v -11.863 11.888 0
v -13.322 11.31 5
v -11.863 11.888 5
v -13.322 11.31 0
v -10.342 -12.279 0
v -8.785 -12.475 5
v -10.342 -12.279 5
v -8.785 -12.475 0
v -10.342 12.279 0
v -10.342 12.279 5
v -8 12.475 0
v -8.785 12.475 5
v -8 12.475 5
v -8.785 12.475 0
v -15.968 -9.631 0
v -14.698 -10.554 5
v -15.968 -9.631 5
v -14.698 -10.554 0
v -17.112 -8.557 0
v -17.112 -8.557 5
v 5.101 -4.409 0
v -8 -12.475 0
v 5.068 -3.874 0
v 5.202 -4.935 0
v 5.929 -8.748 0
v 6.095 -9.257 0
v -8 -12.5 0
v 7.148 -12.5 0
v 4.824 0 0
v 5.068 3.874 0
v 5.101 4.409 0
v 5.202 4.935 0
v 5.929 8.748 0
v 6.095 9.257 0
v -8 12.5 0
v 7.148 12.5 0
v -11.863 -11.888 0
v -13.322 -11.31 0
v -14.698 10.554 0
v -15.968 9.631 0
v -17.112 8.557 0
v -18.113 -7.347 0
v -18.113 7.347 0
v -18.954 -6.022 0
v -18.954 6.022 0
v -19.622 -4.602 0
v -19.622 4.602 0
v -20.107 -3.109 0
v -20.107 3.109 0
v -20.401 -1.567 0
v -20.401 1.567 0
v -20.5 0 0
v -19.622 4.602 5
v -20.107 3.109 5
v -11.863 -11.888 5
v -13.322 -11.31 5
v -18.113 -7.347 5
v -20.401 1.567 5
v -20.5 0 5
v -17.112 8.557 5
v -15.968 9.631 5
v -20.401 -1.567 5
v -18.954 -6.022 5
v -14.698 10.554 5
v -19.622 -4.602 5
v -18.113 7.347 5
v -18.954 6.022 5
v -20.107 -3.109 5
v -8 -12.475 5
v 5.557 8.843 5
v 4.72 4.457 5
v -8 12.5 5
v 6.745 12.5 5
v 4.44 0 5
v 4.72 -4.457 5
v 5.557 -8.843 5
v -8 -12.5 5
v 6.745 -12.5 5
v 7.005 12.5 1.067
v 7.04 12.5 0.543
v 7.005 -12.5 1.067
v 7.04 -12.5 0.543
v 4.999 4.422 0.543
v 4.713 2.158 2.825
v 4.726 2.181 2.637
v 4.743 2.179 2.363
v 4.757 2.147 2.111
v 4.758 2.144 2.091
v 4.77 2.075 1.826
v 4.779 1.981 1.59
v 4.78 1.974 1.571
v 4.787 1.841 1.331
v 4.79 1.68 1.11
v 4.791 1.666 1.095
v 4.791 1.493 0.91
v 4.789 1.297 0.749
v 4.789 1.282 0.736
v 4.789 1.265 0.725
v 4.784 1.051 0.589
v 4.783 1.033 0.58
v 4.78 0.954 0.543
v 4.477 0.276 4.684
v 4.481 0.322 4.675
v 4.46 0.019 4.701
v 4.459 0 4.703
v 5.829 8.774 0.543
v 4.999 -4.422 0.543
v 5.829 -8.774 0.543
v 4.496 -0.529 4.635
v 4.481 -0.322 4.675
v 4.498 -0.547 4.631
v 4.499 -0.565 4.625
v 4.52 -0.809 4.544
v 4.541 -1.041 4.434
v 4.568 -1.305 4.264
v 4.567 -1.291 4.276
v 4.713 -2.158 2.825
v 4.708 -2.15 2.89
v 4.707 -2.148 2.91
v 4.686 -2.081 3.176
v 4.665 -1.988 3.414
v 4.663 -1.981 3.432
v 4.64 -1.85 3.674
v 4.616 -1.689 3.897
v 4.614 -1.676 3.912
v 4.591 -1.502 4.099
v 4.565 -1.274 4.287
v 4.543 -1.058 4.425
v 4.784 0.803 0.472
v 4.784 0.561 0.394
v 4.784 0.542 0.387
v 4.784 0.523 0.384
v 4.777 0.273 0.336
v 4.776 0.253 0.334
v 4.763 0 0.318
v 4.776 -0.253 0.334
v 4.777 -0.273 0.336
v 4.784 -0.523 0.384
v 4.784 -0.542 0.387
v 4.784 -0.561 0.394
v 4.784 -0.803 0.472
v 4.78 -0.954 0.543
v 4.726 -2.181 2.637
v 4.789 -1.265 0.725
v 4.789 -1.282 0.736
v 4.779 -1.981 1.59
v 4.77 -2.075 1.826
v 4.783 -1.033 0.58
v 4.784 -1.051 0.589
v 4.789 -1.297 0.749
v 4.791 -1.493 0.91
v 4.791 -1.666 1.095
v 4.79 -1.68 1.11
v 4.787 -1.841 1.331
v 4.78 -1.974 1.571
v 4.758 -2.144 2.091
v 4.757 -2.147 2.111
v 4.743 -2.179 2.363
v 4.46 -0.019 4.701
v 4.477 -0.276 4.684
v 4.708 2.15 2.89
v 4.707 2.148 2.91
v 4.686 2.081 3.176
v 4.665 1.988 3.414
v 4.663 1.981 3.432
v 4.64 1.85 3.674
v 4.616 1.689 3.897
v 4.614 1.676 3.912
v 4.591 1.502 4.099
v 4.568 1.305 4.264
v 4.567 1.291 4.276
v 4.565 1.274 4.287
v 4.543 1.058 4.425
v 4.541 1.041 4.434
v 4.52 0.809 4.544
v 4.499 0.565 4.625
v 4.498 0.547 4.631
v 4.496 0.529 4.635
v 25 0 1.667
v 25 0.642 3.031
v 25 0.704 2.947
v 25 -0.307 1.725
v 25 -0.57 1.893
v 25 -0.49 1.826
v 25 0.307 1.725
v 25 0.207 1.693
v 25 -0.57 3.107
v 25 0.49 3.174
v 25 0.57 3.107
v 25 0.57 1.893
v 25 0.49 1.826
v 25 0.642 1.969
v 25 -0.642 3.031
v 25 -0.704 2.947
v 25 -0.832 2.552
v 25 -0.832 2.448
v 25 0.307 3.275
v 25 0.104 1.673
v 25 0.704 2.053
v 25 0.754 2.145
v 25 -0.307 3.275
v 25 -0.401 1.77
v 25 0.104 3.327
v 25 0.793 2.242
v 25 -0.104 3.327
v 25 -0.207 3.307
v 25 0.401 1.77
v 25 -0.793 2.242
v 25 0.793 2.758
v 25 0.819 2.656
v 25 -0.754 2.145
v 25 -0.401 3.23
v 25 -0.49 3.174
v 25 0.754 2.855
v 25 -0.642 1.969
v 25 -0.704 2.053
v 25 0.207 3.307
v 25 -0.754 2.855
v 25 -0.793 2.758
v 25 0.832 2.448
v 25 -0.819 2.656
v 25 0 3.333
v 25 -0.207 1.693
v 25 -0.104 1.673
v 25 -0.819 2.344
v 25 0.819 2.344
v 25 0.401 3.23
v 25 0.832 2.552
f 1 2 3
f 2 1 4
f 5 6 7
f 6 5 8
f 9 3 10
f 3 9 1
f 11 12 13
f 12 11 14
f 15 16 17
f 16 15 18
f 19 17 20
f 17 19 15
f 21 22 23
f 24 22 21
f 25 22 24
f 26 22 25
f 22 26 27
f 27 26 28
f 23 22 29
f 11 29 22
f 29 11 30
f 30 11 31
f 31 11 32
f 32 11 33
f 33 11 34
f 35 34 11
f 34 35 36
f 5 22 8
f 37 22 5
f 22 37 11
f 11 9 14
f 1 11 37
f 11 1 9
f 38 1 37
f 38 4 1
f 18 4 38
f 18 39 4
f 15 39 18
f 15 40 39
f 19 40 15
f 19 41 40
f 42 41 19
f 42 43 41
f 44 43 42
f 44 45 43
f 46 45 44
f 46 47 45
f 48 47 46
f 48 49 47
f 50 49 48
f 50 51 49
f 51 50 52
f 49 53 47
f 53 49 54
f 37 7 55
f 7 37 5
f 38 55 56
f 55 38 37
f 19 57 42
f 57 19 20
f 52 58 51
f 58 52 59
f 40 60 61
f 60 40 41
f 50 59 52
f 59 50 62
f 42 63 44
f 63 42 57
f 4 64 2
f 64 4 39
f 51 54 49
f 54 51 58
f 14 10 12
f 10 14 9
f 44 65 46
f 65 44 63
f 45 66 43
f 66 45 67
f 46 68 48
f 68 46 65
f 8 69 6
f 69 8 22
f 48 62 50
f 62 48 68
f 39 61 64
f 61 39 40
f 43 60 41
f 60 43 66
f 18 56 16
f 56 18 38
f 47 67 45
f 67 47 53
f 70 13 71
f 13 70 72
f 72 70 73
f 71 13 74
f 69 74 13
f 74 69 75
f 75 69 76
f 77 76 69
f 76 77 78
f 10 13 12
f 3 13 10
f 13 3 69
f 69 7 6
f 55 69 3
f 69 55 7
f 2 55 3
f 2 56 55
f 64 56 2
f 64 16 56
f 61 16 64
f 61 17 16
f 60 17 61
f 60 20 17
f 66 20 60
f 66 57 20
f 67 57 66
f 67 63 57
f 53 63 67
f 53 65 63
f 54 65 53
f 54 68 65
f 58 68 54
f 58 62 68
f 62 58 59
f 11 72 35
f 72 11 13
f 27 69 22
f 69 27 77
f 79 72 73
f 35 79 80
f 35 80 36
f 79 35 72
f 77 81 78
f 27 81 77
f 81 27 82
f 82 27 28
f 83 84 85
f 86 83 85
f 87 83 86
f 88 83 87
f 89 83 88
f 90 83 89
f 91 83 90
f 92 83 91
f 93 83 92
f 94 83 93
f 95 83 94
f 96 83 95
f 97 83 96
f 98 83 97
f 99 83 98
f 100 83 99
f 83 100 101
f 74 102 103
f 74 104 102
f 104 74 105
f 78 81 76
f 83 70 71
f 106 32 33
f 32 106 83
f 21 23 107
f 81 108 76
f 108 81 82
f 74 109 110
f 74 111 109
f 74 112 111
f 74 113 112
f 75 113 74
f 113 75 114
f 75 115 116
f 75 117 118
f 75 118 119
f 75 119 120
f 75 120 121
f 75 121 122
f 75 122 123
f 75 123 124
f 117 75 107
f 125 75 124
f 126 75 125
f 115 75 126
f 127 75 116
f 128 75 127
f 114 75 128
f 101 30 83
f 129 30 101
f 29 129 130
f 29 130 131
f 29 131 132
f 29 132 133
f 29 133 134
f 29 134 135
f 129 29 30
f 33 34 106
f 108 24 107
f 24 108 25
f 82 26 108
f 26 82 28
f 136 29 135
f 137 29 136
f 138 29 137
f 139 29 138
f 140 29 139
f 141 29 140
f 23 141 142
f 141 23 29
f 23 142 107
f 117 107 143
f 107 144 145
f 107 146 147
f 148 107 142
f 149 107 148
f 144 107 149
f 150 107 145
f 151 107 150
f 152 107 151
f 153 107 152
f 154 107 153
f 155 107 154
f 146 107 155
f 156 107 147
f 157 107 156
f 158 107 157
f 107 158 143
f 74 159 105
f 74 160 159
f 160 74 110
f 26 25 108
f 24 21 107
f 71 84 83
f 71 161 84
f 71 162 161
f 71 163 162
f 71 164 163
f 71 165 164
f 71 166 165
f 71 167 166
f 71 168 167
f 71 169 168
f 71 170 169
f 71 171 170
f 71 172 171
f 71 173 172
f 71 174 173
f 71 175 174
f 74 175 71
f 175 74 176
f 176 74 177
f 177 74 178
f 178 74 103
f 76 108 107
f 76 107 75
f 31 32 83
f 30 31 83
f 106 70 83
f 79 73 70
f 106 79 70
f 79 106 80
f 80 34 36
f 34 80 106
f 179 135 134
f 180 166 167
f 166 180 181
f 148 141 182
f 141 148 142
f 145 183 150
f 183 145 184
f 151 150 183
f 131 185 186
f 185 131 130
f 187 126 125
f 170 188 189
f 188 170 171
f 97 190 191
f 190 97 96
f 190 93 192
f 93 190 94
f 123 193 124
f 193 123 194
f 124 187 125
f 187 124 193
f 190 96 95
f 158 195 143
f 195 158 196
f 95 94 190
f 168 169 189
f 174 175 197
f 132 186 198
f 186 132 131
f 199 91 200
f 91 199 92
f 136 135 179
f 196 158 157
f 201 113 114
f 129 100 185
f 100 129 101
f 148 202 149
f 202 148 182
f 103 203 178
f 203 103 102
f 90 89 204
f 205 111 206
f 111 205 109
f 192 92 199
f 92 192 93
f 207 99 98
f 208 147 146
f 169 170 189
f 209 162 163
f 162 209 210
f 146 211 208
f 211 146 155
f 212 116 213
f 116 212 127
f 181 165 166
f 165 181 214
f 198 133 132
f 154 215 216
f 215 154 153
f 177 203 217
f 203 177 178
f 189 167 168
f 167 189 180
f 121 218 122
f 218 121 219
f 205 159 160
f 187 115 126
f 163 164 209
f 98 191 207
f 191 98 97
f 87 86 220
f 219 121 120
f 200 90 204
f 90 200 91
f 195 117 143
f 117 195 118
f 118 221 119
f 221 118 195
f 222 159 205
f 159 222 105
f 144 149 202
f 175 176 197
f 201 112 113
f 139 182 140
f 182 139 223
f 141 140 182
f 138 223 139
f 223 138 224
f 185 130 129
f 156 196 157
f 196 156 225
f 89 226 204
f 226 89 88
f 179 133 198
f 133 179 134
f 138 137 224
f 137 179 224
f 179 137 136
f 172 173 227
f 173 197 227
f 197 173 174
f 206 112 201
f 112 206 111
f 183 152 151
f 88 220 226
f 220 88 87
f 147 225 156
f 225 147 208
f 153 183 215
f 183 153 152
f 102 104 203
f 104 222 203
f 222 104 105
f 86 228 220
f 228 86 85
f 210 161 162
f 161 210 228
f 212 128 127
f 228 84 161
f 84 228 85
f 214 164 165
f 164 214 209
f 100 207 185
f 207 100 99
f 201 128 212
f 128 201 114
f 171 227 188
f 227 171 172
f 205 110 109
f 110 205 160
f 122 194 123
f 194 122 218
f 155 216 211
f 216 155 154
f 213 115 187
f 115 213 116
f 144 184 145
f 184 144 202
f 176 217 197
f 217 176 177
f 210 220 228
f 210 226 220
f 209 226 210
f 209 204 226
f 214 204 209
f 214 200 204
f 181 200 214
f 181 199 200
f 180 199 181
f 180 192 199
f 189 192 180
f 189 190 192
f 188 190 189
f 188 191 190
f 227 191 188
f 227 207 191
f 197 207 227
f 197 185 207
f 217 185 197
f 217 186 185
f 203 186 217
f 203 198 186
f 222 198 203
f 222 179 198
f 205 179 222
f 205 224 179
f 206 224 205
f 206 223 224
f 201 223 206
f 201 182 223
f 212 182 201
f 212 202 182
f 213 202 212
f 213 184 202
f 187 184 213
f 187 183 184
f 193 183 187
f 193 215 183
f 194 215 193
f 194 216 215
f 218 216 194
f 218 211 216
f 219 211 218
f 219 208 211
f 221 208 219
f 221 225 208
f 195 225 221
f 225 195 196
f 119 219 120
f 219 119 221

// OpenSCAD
// Ewok ear formers
// Foam head ball diameter: ~2.8" (71.12mm)

HEAD_DIAMETER = 71.12;
HEIGHT = 25; //62;
WIDTH = 25; //75;
DEPTH = 5;//10;
POST_HEIGHT = 25;
POST_WIDTH = 10;
POST_DEPTH = 2.5;

$fn=50;

// Visible ear
difference(){
    union(){
        translate([-8,0,0]){
            cylinder(r=WIDTH/2,h=DEPTH);
        }
        translate([-8,-WIDTH/2,0]){
            cube([HEIGHT, WIDTH, DEPTH]);   
        }
    }
 
    translate([40,0,5]){
        sphere(r=HEAD_DIAMETER/2);
    }
}

translate([0,0,POST_DEPTH]){
    rotate([0,90,0]){
        cylinder(r1=POST_DEPTH,r2=POST_DEPTH/3,h=POST_HEIGHT);
    }
}
/*
// Mounting Post
translate([HEIGHT,(WIDTH/2)-(POST_WIDTH/2),0]){
    cube([POST_HEIGHT, POST_WIDTH, POST_DEPTH]);
}
*/
